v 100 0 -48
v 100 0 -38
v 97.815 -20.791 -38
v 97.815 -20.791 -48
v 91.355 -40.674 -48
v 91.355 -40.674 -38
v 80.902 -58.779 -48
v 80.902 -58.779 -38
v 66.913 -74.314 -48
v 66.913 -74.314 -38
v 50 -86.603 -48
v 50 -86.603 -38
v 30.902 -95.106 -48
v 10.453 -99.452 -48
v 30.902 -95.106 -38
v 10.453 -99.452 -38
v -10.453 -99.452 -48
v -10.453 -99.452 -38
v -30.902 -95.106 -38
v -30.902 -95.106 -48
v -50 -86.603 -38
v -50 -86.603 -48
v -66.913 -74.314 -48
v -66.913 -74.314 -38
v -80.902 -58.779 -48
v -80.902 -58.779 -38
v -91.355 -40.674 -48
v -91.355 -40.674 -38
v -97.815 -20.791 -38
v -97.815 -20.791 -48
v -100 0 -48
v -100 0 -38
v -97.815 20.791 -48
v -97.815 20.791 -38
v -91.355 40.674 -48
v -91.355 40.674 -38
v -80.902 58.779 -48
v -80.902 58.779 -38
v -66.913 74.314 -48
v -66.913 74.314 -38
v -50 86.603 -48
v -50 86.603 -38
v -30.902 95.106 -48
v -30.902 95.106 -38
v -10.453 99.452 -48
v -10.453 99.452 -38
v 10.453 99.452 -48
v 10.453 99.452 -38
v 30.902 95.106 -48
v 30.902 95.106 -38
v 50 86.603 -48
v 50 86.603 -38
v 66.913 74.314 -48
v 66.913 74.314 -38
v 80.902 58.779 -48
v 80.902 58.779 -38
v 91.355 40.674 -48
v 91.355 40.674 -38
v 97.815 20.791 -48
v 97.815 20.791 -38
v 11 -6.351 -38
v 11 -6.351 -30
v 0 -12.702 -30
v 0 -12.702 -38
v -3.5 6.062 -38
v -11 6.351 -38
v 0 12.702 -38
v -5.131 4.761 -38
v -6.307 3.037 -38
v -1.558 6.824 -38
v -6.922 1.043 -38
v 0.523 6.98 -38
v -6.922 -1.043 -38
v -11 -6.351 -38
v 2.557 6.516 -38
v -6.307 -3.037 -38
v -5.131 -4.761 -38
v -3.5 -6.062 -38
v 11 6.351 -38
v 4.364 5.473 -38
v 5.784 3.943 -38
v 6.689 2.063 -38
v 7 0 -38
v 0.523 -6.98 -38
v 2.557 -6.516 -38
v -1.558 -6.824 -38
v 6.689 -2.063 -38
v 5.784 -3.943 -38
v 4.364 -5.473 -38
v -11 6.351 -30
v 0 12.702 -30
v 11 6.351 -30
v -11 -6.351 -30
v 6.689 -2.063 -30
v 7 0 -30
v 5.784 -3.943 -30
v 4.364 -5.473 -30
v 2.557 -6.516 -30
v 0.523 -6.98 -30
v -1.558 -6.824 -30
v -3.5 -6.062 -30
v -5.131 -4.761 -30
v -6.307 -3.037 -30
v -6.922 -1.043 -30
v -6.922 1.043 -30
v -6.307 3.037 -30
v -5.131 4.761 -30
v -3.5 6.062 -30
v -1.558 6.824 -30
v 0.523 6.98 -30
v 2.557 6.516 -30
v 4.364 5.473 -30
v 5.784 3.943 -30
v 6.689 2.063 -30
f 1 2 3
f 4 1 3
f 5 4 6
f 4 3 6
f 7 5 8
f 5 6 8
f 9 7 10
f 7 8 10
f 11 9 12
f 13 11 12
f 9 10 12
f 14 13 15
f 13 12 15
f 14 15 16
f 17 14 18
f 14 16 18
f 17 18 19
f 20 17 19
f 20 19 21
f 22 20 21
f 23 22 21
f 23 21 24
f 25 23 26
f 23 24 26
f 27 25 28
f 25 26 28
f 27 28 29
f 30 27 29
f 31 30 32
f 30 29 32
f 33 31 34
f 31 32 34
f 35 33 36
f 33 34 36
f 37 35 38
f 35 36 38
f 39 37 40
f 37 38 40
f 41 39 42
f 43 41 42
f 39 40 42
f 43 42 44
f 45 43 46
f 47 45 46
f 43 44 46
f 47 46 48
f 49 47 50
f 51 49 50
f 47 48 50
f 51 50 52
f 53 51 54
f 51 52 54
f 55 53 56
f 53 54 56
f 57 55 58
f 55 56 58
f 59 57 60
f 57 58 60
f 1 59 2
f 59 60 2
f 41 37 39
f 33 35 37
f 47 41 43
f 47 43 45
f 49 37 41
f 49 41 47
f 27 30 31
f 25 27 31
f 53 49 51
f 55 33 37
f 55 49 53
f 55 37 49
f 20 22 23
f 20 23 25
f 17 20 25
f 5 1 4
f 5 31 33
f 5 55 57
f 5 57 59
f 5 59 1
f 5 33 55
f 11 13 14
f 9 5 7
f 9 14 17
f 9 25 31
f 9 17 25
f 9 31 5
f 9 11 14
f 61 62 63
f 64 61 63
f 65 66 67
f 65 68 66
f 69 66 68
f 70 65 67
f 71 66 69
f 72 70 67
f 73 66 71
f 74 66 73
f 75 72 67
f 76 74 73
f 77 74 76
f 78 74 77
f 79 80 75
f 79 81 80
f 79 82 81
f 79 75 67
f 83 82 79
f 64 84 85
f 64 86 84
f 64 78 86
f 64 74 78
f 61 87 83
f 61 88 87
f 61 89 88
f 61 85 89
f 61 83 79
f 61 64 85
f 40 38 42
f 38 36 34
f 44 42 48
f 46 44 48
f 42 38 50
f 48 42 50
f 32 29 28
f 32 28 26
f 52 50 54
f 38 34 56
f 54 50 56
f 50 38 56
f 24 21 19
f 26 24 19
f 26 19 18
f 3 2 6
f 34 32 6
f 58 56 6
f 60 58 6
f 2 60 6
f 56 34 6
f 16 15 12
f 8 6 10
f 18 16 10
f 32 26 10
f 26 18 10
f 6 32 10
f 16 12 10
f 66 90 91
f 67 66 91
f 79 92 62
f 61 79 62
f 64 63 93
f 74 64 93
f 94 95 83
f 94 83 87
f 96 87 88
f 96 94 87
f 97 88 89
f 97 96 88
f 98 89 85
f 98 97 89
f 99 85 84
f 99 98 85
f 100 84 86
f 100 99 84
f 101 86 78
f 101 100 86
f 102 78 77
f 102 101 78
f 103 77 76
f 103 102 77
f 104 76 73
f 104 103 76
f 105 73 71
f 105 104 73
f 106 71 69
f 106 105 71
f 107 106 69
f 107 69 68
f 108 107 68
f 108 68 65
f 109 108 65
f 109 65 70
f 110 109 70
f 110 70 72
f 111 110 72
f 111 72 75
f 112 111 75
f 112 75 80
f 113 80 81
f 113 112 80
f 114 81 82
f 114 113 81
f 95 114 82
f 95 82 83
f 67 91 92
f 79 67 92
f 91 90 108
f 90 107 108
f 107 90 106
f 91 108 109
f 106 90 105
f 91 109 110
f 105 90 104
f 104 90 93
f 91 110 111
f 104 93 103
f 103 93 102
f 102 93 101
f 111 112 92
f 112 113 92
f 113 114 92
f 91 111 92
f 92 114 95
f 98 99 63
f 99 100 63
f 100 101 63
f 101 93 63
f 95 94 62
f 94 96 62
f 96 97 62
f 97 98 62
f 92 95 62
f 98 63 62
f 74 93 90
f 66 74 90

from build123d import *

# Parameters (mm, degrees)
F0_R     = 27.5
F1_DEPTH = 6
F2_R     = 7
F3_DEPTH = 30
F4_R     = 7
F5_DEPTH = 8
F6_R     = 100
F6_R_2   = 7
F7_DEPTH = 10


with BuildPart() as f1:
    # F0 (on Top) → F1 (new body)
    with BuildSketch(Plane.XY):
        Circle(F0_R)
    extrude(amount=F1_DEPTH)

    # F2 (on face) → F3 (join)
    with BuildSketch(Plane.XY):
        Circle(F2_R)
    extrude(amount=-F3_DEPTH)


with BuildPart() as f5:
    # F4 (on face) → F5 (new body)
    with BuildSketch(Plane(origin=(0, 0, -30), x_dir=(1, 0, 0), z_dir=(0, 0, -1))):
        Polygon((11, -6.3508529611), (11, 6.3508529611), (0, 12.7017059222), (-11, 6.3508529611), (-11, -6.3508529611), (0, -12.7017059222), align=None)
        Circle(F4_R, mode=Mode.SUBTRACT)
    extrude(amount=F5_DEPTH)


with BuildPart() as f7:
    # F6 (on face) → F7 (new body)
    with BuildSketch(Plane(origin=(0, 0, -38), x_dir=(1, 0, 0), z_dir=(0, 0, -1))):
        Circle(F6_R)
        Polygon((11, -6.3508529611), (0, -12.7017059222), (-11, -6.3508529611), (-11, 6.3508529611), (0, 12.7017059222), (11, 6.3508529611), align=None, mode=Mode.SUBTRACT)
        Polygon((-11, -6.3508529611), (0, -12.7017059222), (11, -6.3508529611), (11, 6.3508529611), (0, 12.7017059222), (-11, 6.3508529611), align=None)
        Circle(F6_R_2, mode=Mode.SUBTRACT)
        Circle(F6_R_2)
    extrude(amount=F7_DEPTH)


solid = Compound([f5.part, f7.part])
